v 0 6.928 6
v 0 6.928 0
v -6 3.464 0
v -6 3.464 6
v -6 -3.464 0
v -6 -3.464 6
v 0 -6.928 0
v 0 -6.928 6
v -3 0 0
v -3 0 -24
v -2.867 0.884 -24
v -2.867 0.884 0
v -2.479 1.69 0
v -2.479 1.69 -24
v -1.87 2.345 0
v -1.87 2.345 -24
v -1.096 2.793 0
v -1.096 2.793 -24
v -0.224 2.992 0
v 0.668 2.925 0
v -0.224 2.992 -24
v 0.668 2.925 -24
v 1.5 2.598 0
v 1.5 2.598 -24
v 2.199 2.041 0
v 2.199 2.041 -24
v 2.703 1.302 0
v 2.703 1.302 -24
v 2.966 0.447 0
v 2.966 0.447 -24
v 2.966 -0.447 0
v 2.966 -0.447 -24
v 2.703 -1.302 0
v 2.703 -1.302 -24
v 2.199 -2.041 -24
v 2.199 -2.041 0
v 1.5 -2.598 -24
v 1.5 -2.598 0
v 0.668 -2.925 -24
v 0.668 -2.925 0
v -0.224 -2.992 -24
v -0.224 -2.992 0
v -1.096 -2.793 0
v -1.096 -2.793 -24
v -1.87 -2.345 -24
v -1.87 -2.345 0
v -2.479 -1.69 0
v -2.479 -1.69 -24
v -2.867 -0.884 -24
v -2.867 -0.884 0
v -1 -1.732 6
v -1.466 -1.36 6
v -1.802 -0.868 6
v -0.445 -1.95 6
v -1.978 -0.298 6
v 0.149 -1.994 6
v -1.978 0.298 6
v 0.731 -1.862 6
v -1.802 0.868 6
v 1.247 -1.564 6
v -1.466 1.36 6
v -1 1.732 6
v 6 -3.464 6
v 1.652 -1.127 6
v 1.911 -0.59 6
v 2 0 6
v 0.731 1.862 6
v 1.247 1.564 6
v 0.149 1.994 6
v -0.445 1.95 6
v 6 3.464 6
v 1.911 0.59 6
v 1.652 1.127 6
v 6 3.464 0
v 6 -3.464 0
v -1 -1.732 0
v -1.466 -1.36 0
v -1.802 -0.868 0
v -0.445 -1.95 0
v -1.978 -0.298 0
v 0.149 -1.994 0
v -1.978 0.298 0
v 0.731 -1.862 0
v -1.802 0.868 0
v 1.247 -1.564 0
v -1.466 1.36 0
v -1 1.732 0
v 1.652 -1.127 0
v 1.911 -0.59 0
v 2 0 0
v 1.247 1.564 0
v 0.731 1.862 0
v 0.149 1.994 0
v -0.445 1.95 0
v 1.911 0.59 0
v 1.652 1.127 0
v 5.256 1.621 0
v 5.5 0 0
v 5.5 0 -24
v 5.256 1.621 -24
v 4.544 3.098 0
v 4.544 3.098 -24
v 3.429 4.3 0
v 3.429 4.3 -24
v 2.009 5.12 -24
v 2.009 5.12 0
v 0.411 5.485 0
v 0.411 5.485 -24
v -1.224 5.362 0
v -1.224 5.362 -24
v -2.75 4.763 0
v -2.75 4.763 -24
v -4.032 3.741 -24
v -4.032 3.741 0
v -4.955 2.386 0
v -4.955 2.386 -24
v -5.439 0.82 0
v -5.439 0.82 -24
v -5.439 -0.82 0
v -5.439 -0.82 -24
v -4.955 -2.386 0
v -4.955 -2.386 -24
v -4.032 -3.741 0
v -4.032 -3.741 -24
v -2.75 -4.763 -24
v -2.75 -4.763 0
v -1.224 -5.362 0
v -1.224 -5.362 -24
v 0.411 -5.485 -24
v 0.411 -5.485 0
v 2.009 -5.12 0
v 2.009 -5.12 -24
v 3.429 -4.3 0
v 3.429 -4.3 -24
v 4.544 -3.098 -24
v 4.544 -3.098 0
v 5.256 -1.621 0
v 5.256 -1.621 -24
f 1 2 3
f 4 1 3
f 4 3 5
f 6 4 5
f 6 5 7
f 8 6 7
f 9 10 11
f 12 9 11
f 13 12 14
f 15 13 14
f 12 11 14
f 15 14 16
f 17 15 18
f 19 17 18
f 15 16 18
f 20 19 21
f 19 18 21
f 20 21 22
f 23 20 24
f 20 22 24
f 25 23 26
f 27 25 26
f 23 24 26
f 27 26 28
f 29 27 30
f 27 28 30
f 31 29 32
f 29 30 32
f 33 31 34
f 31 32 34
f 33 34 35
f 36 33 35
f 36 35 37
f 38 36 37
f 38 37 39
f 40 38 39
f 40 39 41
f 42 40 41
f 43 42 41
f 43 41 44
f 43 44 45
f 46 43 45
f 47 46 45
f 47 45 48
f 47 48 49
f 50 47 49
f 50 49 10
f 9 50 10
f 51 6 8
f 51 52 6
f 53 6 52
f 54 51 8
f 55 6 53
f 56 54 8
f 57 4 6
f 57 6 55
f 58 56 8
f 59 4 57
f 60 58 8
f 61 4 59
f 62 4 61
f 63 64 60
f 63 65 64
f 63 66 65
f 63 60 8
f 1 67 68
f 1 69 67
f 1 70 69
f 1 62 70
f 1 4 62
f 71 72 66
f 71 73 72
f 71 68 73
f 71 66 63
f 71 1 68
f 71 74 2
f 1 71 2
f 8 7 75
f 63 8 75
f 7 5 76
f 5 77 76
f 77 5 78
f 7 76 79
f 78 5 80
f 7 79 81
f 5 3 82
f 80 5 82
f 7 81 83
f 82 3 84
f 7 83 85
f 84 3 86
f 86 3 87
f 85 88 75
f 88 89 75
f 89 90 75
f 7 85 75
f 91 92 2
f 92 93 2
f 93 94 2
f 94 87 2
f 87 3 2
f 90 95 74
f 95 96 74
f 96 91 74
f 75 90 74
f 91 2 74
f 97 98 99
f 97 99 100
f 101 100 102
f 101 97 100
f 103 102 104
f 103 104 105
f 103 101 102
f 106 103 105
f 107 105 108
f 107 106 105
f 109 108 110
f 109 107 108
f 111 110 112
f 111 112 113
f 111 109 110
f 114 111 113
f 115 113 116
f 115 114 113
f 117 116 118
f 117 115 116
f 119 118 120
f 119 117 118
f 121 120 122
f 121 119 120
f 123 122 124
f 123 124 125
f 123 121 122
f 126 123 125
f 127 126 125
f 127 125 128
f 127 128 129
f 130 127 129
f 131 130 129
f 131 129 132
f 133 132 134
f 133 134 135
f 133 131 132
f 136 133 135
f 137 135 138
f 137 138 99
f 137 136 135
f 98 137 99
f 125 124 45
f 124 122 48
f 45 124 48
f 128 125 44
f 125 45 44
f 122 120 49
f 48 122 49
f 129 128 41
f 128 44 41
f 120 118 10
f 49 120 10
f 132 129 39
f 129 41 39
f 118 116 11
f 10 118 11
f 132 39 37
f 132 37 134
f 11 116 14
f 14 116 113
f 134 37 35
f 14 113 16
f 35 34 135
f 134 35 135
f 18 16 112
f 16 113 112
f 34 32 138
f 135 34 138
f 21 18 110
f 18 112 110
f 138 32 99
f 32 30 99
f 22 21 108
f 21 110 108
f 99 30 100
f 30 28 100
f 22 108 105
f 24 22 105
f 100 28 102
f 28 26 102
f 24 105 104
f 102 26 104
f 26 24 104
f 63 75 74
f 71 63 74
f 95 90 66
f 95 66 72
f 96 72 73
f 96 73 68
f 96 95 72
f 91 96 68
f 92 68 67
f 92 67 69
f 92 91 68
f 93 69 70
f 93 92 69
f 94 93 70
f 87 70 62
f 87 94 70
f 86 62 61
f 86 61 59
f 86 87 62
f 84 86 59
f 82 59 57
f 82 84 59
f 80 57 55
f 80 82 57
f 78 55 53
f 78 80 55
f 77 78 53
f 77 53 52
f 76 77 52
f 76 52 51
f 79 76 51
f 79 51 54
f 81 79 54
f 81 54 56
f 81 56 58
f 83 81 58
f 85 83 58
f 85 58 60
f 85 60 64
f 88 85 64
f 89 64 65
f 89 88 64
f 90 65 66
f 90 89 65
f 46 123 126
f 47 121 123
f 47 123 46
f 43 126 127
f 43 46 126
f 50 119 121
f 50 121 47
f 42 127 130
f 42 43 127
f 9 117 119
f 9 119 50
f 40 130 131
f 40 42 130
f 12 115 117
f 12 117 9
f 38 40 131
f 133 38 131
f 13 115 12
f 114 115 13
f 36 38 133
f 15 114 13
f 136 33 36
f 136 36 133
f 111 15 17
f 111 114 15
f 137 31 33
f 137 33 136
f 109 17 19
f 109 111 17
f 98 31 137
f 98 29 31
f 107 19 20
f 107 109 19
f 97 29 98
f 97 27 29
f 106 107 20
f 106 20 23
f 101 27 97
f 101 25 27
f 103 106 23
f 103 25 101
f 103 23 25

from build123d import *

# Parameters (mm, degrees)
SKETCH1_R           = 2
BOSS_EXTRUDE1_DEPTH = 6
SKETCH1_2_R         = 5.5
SKETCH1_2_R_2       = 2
BOSS_EXTRUDE3_DEPTH = 24
SKETCH2_R           = 3
CUT_EXTRUDE1_DEPTH  = 25


with BuildPart() as part:
    # Sketch1 → Boss-Extrude1 (new body)
    with BuildSketch(Plane.XY):
        Polygon((6, -3.464101615), (6, 3.464101615), (0, 6.92820323), (-6, 3.464101615), (-6, -3.464101615), (0, -6.92820323), align=None)
        Circle(SKETCH1_R, mode=Mode.SUBTRACT)
    extrude(amount=BOSS_EXTRUDE1_DEPTH)


with BuildPart() as body_2:
    # Sketch1<2> → Boss-Extrude3 (new body)
    with BuildSketch(Plane.XY):
        Circle(SKETCH1_2_R)
        Circle(SKETCH1_2_R_2, mode=Mode.SUBTRACT)
    extrude(amount=-BOSS_EXTRUDE3_DEPTH)

    # Sketch2 → Cut-Extrude1 (cut)
    with BuildSketch(Plane(origin=(0, 0, -24), x_dir=(-1, 0, 0), z_dir=(0, 0, -1))):
        Circle(SKETCH2_R)
    extrude(amount=-CUT_EXTRUDE1_DEPTH, mode=Mode.SUBTRACT)


solid = Compound([part.part, body_2.part])
